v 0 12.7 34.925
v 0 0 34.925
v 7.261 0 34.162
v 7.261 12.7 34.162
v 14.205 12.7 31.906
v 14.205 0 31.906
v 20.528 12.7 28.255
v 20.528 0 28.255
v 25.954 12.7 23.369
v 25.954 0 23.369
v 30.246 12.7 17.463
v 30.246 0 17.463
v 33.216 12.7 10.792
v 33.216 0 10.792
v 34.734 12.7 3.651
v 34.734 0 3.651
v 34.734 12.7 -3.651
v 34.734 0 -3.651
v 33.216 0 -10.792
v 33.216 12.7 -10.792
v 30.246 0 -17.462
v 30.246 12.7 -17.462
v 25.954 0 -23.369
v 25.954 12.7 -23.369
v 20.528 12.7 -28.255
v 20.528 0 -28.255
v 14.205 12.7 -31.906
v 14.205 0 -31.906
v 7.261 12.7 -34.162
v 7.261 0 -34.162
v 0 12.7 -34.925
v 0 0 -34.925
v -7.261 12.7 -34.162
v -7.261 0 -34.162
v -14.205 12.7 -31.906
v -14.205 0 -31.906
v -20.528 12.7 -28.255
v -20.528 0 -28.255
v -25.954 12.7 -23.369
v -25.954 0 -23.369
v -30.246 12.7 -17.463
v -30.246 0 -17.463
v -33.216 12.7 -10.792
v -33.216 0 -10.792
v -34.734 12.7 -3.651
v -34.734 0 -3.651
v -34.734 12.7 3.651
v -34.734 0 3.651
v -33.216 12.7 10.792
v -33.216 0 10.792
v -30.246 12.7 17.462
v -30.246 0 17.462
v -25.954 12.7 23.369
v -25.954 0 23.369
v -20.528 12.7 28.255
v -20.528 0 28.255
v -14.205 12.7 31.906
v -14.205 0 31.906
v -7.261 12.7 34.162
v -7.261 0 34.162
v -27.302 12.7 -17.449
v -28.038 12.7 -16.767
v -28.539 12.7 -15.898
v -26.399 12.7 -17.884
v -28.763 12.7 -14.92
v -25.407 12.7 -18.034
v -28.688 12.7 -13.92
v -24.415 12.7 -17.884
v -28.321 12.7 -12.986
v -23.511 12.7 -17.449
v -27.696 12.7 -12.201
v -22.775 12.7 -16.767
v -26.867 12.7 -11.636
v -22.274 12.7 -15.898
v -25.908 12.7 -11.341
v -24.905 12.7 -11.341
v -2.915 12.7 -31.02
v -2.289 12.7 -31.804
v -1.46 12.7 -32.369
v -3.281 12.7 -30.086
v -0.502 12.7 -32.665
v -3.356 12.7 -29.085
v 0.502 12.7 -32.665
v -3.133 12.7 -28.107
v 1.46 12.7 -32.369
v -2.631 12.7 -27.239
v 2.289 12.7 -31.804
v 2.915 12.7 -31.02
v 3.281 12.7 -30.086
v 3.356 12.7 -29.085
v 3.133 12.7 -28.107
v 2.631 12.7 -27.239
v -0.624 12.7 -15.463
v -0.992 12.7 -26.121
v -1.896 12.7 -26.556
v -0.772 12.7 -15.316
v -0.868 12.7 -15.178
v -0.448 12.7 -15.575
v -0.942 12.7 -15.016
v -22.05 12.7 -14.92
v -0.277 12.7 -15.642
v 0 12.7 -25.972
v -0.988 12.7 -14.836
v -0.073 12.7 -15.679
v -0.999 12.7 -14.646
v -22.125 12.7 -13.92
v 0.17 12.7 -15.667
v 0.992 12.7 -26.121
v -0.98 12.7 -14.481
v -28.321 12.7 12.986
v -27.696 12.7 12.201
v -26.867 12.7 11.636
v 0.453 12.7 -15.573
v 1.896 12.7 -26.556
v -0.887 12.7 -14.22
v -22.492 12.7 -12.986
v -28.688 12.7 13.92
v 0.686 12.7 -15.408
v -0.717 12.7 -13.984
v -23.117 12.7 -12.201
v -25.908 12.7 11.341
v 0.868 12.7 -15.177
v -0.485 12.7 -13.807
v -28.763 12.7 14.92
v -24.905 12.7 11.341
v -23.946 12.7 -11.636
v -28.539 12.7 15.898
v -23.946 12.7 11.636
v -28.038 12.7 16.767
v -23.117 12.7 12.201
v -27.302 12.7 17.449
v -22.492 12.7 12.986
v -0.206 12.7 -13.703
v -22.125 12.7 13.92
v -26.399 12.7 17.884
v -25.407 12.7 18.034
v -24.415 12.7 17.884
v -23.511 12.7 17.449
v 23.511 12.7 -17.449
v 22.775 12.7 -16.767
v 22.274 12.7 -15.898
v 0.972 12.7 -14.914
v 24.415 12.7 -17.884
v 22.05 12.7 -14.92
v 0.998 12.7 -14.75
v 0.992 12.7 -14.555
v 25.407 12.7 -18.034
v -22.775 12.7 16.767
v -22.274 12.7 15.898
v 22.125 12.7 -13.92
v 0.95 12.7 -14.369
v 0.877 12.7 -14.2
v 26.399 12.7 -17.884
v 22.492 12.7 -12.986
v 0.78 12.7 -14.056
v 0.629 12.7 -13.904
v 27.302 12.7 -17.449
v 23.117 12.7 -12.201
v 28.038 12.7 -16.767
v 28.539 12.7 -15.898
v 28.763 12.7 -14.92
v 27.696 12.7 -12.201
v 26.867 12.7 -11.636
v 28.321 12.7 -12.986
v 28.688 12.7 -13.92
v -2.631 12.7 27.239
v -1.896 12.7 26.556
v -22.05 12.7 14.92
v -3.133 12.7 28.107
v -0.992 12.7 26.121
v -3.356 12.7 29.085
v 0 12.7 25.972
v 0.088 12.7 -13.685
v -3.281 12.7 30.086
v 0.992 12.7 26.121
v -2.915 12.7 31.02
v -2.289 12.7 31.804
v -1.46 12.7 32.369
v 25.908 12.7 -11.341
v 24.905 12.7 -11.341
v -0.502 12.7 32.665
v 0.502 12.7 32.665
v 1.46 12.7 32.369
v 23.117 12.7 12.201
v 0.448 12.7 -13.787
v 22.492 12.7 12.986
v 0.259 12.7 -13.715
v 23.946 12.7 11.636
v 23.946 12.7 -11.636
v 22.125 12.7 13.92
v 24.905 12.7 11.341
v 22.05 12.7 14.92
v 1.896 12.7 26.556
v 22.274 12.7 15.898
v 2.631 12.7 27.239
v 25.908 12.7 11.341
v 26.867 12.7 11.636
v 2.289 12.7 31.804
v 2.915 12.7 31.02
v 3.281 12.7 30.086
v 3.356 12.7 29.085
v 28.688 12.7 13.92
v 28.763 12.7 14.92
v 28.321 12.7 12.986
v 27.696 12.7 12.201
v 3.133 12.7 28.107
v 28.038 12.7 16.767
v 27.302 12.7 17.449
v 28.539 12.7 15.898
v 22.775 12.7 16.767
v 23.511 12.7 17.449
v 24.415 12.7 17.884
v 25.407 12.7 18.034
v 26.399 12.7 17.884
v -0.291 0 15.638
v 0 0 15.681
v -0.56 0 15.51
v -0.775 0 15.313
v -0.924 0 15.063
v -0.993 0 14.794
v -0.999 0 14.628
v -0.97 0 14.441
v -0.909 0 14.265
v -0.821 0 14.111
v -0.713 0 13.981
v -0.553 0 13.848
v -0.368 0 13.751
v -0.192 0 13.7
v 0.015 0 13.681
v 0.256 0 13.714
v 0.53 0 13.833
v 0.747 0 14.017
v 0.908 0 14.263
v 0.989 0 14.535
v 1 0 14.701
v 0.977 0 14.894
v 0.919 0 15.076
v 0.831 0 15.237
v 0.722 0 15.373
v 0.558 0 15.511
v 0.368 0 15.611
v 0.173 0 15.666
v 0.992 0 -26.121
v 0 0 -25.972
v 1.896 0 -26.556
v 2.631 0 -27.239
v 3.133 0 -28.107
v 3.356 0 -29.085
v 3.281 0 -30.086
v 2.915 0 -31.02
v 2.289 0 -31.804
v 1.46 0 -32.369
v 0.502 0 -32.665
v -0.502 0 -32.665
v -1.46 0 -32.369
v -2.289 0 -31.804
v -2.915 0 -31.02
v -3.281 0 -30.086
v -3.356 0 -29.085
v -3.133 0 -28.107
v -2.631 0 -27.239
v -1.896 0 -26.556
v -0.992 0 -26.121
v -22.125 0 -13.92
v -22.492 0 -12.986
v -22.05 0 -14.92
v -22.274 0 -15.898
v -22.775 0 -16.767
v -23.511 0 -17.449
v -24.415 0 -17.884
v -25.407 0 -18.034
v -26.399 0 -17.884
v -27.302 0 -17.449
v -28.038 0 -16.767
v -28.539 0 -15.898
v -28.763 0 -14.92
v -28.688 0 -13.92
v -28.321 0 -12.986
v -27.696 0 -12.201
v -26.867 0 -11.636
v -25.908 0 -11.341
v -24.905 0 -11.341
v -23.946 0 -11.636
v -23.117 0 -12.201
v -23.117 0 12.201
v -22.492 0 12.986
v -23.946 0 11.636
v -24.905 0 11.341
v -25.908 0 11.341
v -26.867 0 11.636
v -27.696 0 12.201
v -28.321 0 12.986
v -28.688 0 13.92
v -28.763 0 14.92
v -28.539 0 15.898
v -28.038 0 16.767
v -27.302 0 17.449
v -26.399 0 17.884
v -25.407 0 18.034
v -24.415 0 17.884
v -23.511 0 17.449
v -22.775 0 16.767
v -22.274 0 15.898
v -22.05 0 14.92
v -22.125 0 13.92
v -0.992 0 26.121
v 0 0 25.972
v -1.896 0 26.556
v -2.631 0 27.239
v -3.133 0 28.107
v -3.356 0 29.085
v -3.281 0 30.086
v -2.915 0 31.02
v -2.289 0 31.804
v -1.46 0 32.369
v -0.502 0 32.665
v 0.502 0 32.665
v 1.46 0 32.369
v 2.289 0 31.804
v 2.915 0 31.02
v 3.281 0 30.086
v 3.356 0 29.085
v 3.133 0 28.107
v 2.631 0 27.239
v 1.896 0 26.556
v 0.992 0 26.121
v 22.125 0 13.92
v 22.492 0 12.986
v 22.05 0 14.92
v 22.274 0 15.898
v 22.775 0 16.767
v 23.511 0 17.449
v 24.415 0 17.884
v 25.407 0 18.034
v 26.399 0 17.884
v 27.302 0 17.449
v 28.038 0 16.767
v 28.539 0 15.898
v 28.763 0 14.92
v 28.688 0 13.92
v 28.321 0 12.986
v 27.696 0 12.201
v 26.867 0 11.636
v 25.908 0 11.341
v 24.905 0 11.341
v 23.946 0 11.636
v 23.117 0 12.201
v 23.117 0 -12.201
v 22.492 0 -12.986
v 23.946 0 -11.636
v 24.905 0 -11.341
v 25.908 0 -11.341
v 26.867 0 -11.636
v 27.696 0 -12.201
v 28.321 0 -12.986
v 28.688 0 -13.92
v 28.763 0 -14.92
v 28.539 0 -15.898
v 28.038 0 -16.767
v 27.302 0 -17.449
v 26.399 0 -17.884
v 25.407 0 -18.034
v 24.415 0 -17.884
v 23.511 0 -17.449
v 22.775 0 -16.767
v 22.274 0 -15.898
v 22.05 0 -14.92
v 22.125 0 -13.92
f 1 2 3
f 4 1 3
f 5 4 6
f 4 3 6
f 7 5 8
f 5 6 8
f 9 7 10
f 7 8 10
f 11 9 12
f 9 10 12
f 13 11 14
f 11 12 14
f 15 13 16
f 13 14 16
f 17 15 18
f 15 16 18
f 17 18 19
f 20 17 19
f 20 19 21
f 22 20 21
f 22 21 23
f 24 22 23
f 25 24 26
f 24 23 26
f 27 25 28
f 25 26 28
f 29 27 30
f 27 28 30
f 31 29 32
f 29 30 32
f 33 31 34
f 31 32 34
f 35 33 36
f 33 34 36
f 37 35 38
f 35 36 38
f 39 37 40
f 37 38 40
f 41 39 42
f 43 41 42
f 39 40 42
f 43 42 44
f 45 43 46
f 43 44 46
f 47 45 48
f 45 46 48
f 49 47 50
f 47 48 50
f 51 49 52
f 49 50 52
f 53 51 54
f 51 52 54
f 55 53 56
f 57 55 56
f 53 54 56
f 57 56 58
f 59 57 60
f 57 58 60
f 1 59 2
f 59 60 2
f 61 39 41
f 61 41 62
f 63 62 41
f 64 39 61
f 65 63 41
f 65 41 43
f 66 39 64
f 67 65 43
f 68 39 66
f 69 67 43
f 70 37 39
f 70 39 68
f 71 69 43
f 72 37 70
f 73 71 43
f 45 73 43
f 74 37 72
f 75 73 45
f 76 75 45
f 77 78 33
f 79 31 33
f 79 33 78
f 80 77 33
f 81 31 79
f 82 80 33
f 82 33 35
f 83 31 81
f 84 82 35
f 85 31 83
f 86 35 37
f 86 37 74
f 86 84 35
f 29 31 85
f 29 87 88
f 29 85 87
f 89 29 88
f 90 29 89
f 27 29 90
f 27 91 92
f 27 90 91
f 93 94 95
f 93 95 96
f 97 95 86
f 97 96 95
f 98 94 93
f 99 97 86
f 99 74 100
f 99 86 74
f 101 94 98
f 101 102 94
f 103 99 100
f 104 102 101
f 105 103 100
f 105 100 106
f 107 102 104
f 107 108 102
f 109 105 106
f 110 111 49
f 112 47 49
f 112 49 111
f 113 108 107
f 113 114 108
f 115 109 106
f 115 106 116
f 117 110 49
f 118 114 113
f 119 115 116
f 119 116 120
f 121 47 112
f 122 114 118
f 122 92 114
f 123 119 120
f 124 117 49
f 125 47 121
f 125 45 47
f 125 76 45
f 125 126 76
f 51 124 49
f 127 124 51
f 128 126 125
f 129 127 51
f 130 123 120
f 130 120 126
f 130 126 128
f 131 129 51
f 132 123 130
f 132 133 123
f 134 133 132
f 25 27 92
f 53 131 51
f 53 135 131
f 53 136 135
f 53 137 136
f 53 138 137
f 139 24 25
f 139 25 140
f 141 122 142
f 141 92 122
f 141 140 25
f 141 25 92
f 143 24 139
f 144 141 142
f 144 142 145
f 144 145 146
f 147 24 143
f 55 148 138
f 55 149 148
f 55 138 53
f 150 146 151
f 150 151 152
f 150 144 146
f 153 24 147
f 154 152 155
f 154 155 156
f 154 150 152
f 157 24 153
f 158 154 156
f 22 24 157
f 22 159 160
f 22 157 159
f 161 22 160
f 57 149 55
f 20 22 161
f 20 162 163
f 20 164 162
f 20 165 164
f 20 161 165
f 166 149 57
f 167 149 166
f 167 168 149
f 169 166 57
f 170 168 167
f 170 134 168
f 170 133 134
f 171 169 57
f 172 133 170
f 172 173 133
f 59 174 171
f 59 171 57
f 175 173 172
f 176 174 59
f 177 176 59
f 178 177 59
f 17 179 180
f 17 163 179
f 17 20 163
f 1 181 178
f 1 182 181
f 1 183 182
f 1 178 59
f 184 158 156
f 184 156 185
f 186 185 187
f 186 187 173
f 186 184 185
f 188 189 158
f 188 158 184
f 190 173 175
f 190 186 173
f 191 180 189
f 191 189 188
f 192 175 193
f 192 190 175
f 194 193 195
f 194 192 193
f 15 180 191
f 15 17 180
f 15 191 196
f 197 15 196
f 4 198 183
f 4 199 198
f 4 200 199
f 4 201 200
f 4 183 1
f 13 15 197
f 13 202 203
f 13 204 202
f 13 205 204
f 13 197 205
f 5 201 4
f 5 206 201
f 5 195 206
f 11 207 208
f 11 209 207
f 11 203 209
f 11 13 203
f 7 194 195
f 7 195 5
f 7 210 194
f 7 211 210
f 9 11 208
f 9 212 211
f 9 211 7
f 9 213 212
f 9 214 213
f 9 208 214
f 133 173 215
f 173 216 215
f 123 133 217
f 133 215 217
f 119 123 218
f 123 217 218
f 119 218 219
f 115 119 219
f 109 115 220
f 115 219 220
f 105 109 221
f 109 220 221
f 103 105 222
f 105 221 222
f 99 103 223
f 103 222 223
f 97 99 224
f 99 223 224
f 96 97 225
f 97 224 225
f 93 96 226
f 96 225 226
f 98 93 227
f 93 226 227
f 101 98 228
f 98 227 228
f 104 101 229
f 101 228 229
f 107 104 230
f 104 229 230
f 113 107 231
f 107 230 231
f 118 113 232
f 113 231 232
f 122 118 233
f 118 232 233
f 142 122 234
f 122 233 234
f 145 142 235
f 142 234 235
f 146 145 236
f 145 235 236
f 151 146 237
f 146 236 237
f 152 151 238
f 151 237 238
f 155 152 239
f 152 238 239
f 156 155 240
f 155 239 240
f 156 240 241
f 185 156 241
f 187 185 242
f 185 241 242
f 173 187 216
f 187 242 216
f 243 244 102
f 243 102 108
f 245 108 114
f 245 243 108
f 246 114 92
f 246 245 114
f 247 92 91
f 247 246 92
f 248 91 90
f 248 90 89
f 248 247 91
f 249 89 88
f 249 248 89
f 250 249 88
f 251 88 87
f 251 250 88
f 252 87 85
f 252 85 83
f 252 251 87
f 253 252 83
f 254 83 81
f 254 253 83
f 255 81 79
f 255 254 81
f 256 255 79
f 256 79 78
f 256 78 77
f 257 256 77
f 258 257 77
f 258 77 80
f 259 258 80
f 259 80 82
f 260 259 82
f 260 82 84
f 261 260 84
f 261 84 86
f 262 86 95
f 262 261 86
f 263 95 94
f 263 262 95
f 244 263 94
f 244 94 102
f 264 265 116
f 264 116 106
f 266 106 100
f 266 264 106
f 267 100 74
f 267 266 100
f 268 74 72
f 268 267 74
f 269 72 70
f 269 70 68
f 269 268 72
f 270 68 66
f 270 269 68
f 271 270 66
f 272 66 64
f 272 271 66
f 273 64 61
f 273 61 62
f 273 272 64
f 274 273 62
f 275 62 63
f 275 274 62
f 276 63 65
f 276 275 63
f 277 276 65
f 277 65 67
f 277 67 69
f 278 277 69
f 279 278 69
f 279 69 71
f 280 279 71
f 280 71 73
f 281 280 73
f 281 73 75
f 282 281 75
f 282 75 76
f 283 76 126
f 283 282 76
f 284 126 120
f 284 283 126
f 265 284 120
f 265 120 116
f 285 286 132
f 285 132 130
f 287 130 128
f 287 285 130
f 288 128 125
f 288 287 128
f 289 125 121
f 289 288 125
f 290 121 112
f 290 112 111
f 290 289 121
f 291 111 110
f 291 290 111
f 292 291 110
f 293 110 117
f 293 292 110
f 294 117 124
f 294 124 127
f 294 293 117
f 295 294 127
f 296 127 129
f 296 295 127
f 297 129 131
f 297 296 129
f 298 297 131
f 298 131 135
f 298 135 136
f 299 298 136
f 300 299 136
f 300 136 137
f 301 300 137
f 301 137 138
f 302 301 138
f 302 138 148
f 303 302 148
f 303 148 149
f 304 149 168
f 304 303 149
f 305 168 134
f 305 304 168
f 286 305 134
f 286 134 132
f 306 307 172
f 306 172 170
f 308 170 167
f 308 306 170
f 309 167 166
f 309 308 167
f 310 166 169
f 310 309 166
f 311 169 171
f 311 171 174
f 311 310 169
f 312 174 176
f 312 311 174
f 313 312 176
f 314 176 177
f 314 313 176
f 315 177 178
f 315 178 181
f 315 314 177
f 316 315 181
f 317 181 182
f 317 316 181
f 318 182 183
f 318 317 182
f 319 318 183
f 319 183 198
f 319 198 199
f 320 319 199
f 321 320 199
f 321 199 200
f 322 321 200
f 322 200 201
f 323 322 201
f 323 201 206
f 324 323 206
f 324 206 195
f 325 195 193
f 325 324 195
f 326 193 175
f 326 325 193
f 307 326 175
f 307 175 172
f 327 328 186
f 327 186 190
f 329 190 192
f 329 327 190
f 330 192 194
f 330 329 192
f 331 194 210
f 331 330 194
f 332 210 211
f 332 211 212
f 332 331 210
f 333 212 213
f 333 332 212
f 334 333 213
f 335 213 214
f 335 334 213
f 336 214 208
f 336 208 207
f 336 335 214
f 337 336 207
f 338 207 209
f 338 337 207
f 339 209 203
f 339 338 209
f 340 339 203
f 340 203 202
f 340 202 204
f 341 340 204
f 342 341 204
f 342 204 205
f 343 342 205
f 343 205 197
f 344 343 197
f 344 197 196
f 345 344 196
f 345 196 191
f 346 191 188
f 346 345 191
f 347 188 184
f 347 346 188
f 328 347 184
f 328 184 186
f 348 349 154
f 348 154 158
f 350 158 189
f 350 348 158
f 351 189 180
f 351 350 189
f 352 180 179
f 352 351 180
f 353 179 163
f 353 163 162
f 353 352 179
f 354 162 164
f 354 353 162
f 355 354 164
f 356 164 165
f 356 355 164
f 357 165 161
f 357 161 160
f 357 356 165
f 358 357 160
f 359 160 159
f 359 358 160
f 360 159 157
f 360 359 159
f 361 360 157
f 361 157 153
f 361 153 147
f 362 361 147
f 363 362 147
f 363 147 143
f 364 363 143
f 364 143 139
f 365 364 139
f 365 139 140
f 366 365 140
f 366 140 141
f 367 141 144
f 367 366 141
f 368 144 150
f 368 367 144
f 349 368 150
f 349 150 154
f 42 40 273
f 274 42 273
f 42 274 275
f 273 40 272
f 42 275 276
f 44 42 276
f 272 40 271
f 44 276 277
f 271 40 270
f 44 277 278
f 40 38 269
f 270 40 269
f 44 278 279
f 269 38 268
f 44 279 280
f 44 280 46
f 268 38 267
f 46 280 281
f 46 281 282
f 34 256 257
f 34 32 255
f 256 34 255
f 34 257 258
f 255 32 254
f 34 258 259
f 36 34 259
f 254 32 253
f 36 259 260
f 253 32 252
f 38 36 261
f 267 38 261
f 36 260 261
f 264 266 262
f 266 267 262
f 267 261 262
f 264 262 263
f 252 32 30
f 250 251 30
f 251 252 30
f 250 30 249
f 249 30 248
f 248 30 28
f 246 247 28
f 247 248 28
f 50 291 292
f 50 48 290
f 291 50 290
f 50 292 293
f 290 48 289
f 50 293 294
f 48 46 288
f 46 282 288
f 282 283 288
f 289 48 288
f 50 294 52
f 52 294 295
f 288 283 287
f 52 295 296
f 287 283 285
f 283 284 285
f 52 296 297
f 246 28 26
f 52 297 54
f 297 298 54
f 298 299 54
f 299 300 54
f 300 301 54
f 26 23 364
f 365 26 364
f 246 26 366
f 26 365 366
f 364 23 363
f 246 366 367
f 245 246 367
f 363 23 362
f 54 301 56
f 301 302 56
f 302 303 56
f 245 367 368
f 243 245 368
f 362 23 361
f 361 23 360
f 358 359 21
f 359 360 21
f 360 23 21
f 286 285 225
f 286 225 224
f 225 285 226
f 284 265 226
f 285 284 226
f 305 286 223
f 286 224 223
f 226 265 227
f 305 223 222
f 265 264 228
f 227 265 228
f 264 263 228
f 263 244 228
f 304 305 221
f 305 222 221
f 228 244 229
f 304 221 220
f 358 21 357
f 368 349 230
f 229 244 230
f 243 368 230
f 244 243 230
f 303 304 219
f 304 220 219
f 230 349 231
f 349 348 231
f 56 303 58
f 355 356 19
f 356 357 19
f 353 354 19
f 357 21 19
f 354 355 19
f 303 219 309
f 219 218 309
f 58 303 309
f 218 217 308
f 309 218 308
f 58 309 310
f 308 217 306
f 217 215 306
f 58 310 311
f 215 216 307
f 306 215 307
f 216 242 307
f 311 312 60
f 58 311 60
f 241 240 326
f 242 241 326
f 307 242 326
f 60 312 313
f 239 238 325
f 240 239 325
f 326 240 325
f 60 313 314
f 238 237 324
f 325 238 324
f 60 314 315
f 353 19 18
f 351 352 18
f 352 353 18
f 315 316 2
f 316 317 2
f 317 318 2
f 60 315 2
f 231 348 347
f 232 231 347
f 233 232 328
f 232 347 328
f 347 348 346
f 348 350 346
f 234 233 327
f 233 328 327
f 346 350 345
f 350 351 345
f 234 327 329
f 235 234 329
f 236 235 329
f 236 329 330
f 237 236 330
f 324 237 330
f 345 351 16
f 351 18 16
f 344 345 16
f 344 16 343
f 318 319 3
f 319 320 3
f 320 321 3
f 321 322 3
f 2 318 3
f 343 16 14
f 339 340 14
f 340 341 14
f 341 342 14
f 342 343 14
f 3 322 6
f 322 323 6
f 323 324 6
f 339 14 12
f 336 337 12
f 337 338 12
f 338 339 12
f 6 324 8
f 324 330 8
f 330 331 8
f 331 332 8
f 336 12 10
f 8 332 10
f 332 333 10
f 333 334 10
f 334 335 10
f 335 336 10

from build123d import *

# Parameters (mm, degrees)
SKETCH1_R          = 34.925
EXTRUDE1_DEPTH     = 12.7
SKETCH3_R          = 3.3655
CUT_EXTRUDE2_DEPTH = 12.7
CIRPATTERN1_COUNT  = 6


with BuildPart() as part:
    # Sketch1 → Extrude1 (new body)
    with BuildSketch(Plane(origin=(0, 0, 0), x_dir=(1, 0, 0), z_dir=(0, 1, 0))):
        with Locations(Location((0, 0, 0), (0, 0, 270))):
            Circle(SKETCH1_R)
    extrude(amount=EXTRUDE1_DEPTH)

    # Sketch3 → Cut-Extrude2 (cut)
    with BuildSketch(Plane(origin=(0, 0, 0), x_dir=(1, 0, 0), z_dir=(0, 1, 0))):
        with Locations(Location((0, 29.337, 0), (0, 0, 270))):
            Circle(SKETCH3_R)
    cut_extrude2 = extrude(amount=CUT_EXTRUDE2_DEPTH, mode=Mode.SUBTRACT)

    # CirPattern1: Cut-Extrude2 ×6 about axis
    cirpattern1_axis = Axis((0, 0, 0), (0, 1, 0))
    for i in range(1, CIRPATTERN1_COUNT):
        add(cut_extrude2.rotate(cirpattern1_axis, i * 360 / CIRPATTERN1_COUNT), mode=Mode.SUBTRACT)

    # Cut-Loft1: read off the stored shape, not the designer's step
    # Cut-Loft1: loft between two sections, ruled curve by curve
    cut_loft1_from = [
        Edge.make_bspline([(0.087851197, 12.7, -13.685066391), (0.004840062, 12.7, -13.677745458), (-0.089952358, 12.7, -13.679558172), (-0.299208166, 12.7, -13.721068628), (-0.414116861, 12.7, -13.7612625), (-0.640681556, 12.7, -13.901902289), (-0.751907991, 12.7, -14.003527296), (-0.92329137, 12.7, -14.266303666), (-0.981491743, 12.7, -14.427326535), (-1.010775475, 12.7, -14.759371072), (-0.981656178, 12.7, -14.928094853), (-0.85891014, 12.7, -15.216811138), (-0.767187279, 12.7, -15.336334686), (-0.568734967, 12.7, -15.514457652), (-0.462634818, 12.7, -15.574142777), (-0.2638743, 12.7, -15.651637083), (-0.170862331, 12.7, -15.670012676), (-0.004840062, 12.7, -15.684654542), (0.089952358, 12.7, -15.682841828), (0.299208166, 12.7, -15.641331372), (0.414116861, 12.7, -15.6011375), (0.640681556, 12.7, -15.460497711), (0.751907991, 12.7, -15.358872704), (0.92329137, 12.7, -15.096096334), (0.981491743, 12.7, -14.935073465), (1.010775475, 12.7, -14.603028928), (0.981656178, 12.7, -14.434305147), (0.85891014, 12.7, -14.145588862), (0.767187279, 12.7, -14.026065314), (0.568734967, 12.7, -13.847942348), (0.462634818, 12.7, -13.788257223), (0.2638743, 12.7, -13.710762917), (0.170862331, 12.7, -13.692387324), (0.087851197, 12.7, -13.685066391)], [0, 0, 0, 0, 0.0625, 0.0625, 0.125, 0.125, 0.1875, 0.1875, 0.25, 0.25, 0.3125, 0.3125, 0.375, 0.375, 0.4375, 0.4375, 0.5, 0.5, 0.5625, 0.5625, 0.625, 0.625, 0.6875, 0.6875, 0.75, 0.75, 0.8125, 0.8125, 0.875, 0.875, 0.9375, 0.9375, 1, 1, 1, 1], 3),
    ]
    cut_loft1_to = [
        Edge.make_bspline([(0, 0, 15.6812), (-0.083333333, 0, 15.6812), (-0.1776, 0, 15.671066667), (-0.3824, 0, 15.611333333), (-0.493333333, 0, 15.5612), (-0.706666667, 0, 15.4012), (-0.808535179, 0, 15.29019654), (-0.956170704, 0, 15.013379931), (-1, 0, 14.847866667), (-1, 0, 14.514533333), (-0.956170704, 0, 14.349020069), (-0.808535179, 0, 14.07220346), (-0.706666667, 0, 13.9612), (-0.493333333, 0, 13.8012), (-0.3824, 0, 13.751066667), (-0.1776, 0, 13.691333333), (-0.083333333, 0, 13.6812), (0.083333333, 0, 13.6812), (0.1776, 0, 13.691333333), (0.3824, 0, 13.751066667), (0.493333333, 0, 13.8012), (0.706666667, 0, 13.9612), (0.808535179, 0, 14.07220346), (0.956170704, 0, 14.349020069), (1, 0, 14.514533333), (1, 0, 14.847866667), (0.956170704, 0, 15.013379931), (0.808535179, 0, 15.29019654), (0.706666667, 0, 15.4012), (0.493333333, 0, 15.5612), (0.3824, 0, 15.611333333), (0.1776, 0, 15.671066667), (0.083333333, 0, 15.6812), (0, 0, 15.6812)], [0, 0, 0, 0, 0.0625, 0.0625, 0.125, 0.125, 0.1875, 0.1875, 0.25, 0.25, 0.3125, 0.3125, 0.375, 0.375, 0.4375, 0.4375, 0.5, 0.5, 0.5625, 0.5625, 0.625, 0.625, 0.6875, 0.6875, 0.75, 0.75, 0.8125, 0.8125, 0.875, 0.875, 0.9375, 0.9375, 1, 1, 1, 1], 3),
    ]
    cut_loft1 = Solid(Shell([*[Face.make_surface_from_curves(cut_loft1_from[k], cut_loft1_to[k]) for k in range(1)], Face(Wire(cut_loft1_from)), Face(Wire(cut_loft1_to))]))
    add(cut_loft1, mode=Mode.SUBTRACT)


solid = part.part
